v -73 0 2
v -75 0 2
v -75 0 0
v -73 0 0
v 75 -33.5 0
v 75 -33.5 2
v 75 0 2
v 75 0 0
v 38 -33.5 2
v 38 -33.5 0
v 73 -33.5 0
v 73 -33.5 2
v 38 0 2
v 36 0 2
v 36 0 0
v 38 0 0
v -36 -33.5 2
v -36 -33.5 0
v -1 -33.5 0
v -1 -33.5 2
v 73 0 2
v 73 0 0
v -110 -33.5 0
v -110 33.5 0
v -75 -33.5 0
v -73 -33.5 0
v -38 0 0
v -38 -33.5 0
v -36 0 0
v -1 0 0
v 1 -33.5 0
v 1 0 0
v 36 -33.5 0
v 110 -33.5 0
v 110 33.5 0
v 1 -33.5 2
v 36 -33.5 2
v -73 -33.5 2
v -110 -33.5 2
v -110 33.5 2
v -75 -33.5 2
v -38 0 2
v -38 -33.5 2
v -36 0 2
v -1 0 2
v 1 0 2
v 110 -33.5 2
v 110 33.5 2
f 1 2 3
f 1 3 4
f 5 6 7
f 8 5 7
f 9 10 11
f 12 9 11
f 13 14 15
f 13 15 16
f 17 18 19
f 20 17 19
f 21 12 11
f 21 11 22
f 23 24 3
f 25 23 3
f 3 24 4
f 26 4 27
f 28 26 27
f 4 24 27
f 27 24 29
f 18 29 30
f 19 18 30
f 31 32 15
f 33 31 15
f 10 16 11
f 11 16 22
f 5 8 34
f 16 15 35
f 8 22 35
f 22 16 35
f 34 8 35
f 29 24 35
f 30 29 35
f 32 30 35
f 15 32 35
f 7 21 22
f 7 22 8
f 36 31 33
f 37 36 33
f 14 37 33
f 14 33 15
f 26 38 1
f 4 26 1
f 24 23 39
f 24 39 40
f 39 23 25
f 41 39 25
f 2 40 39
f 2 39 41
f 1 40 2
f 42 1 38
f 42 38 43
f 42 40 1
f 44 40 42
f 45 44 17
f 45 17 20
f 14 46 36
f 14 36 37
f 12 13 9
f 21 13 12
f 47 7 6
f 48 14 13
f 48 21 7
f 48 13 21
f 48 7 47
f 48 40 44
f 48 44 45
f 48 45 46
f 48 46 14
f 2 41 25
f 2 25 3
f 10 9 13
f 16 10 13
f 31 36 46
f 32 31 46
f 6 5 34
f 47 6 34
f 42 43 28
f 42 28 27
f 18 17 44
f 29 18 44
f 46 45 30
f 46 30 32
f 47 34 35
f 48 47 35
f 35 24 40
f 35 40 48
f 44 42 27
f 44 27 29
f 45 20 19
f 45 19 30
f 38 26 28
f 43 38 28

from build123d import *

# Parameters (mm, degrees)
SKETCH1_W           = 220
SKETCH1_H           = 67
BOSS_EXTRUDE1_DEPTH = 2
SKETCH2_W           = 2
SKETCH2_H           = 33.5
CUT_EXTRUDE1_DEPTH  = 116.005434654


with BuildPart() as part:
    # Sketch1 → Boss-Extrude1 (new body)
    with BuildSketch(Plane.XY):
        Rectangle(SKETCH1_W, SKETCH1_H)
    extrude(amount=BOSS_EXTRUDE1_DEPTH)

    # Sketch2 → Cut-Extrude1 (cut, through all)
    with BuildSketch(Plane.XY.offset(2)):
        with Locations((-37, -16.75)):
            Rectangle(SKETCH2_W, SKETCH2_H)
        with Locations((-74, -16.75)):
            Rectangle(SKETCH2_W, SKETCH2_H)
        with Locations((74, -16.75)):
            Rectangle(SKETCH2_W, SKETCH2_H)
        with Locations((37, -16.75)):
            Rectangle(SKETCH2_W, SKETCH2_H)
        with Locations((0, -16.75)):
            Rectangle(SKETCH2_W, SKETCH2_H)
    extrude(amount=-CUT_EXTRUDE1_DEPTH, mode=Mode.SUBTRACT)


solid = part.part
